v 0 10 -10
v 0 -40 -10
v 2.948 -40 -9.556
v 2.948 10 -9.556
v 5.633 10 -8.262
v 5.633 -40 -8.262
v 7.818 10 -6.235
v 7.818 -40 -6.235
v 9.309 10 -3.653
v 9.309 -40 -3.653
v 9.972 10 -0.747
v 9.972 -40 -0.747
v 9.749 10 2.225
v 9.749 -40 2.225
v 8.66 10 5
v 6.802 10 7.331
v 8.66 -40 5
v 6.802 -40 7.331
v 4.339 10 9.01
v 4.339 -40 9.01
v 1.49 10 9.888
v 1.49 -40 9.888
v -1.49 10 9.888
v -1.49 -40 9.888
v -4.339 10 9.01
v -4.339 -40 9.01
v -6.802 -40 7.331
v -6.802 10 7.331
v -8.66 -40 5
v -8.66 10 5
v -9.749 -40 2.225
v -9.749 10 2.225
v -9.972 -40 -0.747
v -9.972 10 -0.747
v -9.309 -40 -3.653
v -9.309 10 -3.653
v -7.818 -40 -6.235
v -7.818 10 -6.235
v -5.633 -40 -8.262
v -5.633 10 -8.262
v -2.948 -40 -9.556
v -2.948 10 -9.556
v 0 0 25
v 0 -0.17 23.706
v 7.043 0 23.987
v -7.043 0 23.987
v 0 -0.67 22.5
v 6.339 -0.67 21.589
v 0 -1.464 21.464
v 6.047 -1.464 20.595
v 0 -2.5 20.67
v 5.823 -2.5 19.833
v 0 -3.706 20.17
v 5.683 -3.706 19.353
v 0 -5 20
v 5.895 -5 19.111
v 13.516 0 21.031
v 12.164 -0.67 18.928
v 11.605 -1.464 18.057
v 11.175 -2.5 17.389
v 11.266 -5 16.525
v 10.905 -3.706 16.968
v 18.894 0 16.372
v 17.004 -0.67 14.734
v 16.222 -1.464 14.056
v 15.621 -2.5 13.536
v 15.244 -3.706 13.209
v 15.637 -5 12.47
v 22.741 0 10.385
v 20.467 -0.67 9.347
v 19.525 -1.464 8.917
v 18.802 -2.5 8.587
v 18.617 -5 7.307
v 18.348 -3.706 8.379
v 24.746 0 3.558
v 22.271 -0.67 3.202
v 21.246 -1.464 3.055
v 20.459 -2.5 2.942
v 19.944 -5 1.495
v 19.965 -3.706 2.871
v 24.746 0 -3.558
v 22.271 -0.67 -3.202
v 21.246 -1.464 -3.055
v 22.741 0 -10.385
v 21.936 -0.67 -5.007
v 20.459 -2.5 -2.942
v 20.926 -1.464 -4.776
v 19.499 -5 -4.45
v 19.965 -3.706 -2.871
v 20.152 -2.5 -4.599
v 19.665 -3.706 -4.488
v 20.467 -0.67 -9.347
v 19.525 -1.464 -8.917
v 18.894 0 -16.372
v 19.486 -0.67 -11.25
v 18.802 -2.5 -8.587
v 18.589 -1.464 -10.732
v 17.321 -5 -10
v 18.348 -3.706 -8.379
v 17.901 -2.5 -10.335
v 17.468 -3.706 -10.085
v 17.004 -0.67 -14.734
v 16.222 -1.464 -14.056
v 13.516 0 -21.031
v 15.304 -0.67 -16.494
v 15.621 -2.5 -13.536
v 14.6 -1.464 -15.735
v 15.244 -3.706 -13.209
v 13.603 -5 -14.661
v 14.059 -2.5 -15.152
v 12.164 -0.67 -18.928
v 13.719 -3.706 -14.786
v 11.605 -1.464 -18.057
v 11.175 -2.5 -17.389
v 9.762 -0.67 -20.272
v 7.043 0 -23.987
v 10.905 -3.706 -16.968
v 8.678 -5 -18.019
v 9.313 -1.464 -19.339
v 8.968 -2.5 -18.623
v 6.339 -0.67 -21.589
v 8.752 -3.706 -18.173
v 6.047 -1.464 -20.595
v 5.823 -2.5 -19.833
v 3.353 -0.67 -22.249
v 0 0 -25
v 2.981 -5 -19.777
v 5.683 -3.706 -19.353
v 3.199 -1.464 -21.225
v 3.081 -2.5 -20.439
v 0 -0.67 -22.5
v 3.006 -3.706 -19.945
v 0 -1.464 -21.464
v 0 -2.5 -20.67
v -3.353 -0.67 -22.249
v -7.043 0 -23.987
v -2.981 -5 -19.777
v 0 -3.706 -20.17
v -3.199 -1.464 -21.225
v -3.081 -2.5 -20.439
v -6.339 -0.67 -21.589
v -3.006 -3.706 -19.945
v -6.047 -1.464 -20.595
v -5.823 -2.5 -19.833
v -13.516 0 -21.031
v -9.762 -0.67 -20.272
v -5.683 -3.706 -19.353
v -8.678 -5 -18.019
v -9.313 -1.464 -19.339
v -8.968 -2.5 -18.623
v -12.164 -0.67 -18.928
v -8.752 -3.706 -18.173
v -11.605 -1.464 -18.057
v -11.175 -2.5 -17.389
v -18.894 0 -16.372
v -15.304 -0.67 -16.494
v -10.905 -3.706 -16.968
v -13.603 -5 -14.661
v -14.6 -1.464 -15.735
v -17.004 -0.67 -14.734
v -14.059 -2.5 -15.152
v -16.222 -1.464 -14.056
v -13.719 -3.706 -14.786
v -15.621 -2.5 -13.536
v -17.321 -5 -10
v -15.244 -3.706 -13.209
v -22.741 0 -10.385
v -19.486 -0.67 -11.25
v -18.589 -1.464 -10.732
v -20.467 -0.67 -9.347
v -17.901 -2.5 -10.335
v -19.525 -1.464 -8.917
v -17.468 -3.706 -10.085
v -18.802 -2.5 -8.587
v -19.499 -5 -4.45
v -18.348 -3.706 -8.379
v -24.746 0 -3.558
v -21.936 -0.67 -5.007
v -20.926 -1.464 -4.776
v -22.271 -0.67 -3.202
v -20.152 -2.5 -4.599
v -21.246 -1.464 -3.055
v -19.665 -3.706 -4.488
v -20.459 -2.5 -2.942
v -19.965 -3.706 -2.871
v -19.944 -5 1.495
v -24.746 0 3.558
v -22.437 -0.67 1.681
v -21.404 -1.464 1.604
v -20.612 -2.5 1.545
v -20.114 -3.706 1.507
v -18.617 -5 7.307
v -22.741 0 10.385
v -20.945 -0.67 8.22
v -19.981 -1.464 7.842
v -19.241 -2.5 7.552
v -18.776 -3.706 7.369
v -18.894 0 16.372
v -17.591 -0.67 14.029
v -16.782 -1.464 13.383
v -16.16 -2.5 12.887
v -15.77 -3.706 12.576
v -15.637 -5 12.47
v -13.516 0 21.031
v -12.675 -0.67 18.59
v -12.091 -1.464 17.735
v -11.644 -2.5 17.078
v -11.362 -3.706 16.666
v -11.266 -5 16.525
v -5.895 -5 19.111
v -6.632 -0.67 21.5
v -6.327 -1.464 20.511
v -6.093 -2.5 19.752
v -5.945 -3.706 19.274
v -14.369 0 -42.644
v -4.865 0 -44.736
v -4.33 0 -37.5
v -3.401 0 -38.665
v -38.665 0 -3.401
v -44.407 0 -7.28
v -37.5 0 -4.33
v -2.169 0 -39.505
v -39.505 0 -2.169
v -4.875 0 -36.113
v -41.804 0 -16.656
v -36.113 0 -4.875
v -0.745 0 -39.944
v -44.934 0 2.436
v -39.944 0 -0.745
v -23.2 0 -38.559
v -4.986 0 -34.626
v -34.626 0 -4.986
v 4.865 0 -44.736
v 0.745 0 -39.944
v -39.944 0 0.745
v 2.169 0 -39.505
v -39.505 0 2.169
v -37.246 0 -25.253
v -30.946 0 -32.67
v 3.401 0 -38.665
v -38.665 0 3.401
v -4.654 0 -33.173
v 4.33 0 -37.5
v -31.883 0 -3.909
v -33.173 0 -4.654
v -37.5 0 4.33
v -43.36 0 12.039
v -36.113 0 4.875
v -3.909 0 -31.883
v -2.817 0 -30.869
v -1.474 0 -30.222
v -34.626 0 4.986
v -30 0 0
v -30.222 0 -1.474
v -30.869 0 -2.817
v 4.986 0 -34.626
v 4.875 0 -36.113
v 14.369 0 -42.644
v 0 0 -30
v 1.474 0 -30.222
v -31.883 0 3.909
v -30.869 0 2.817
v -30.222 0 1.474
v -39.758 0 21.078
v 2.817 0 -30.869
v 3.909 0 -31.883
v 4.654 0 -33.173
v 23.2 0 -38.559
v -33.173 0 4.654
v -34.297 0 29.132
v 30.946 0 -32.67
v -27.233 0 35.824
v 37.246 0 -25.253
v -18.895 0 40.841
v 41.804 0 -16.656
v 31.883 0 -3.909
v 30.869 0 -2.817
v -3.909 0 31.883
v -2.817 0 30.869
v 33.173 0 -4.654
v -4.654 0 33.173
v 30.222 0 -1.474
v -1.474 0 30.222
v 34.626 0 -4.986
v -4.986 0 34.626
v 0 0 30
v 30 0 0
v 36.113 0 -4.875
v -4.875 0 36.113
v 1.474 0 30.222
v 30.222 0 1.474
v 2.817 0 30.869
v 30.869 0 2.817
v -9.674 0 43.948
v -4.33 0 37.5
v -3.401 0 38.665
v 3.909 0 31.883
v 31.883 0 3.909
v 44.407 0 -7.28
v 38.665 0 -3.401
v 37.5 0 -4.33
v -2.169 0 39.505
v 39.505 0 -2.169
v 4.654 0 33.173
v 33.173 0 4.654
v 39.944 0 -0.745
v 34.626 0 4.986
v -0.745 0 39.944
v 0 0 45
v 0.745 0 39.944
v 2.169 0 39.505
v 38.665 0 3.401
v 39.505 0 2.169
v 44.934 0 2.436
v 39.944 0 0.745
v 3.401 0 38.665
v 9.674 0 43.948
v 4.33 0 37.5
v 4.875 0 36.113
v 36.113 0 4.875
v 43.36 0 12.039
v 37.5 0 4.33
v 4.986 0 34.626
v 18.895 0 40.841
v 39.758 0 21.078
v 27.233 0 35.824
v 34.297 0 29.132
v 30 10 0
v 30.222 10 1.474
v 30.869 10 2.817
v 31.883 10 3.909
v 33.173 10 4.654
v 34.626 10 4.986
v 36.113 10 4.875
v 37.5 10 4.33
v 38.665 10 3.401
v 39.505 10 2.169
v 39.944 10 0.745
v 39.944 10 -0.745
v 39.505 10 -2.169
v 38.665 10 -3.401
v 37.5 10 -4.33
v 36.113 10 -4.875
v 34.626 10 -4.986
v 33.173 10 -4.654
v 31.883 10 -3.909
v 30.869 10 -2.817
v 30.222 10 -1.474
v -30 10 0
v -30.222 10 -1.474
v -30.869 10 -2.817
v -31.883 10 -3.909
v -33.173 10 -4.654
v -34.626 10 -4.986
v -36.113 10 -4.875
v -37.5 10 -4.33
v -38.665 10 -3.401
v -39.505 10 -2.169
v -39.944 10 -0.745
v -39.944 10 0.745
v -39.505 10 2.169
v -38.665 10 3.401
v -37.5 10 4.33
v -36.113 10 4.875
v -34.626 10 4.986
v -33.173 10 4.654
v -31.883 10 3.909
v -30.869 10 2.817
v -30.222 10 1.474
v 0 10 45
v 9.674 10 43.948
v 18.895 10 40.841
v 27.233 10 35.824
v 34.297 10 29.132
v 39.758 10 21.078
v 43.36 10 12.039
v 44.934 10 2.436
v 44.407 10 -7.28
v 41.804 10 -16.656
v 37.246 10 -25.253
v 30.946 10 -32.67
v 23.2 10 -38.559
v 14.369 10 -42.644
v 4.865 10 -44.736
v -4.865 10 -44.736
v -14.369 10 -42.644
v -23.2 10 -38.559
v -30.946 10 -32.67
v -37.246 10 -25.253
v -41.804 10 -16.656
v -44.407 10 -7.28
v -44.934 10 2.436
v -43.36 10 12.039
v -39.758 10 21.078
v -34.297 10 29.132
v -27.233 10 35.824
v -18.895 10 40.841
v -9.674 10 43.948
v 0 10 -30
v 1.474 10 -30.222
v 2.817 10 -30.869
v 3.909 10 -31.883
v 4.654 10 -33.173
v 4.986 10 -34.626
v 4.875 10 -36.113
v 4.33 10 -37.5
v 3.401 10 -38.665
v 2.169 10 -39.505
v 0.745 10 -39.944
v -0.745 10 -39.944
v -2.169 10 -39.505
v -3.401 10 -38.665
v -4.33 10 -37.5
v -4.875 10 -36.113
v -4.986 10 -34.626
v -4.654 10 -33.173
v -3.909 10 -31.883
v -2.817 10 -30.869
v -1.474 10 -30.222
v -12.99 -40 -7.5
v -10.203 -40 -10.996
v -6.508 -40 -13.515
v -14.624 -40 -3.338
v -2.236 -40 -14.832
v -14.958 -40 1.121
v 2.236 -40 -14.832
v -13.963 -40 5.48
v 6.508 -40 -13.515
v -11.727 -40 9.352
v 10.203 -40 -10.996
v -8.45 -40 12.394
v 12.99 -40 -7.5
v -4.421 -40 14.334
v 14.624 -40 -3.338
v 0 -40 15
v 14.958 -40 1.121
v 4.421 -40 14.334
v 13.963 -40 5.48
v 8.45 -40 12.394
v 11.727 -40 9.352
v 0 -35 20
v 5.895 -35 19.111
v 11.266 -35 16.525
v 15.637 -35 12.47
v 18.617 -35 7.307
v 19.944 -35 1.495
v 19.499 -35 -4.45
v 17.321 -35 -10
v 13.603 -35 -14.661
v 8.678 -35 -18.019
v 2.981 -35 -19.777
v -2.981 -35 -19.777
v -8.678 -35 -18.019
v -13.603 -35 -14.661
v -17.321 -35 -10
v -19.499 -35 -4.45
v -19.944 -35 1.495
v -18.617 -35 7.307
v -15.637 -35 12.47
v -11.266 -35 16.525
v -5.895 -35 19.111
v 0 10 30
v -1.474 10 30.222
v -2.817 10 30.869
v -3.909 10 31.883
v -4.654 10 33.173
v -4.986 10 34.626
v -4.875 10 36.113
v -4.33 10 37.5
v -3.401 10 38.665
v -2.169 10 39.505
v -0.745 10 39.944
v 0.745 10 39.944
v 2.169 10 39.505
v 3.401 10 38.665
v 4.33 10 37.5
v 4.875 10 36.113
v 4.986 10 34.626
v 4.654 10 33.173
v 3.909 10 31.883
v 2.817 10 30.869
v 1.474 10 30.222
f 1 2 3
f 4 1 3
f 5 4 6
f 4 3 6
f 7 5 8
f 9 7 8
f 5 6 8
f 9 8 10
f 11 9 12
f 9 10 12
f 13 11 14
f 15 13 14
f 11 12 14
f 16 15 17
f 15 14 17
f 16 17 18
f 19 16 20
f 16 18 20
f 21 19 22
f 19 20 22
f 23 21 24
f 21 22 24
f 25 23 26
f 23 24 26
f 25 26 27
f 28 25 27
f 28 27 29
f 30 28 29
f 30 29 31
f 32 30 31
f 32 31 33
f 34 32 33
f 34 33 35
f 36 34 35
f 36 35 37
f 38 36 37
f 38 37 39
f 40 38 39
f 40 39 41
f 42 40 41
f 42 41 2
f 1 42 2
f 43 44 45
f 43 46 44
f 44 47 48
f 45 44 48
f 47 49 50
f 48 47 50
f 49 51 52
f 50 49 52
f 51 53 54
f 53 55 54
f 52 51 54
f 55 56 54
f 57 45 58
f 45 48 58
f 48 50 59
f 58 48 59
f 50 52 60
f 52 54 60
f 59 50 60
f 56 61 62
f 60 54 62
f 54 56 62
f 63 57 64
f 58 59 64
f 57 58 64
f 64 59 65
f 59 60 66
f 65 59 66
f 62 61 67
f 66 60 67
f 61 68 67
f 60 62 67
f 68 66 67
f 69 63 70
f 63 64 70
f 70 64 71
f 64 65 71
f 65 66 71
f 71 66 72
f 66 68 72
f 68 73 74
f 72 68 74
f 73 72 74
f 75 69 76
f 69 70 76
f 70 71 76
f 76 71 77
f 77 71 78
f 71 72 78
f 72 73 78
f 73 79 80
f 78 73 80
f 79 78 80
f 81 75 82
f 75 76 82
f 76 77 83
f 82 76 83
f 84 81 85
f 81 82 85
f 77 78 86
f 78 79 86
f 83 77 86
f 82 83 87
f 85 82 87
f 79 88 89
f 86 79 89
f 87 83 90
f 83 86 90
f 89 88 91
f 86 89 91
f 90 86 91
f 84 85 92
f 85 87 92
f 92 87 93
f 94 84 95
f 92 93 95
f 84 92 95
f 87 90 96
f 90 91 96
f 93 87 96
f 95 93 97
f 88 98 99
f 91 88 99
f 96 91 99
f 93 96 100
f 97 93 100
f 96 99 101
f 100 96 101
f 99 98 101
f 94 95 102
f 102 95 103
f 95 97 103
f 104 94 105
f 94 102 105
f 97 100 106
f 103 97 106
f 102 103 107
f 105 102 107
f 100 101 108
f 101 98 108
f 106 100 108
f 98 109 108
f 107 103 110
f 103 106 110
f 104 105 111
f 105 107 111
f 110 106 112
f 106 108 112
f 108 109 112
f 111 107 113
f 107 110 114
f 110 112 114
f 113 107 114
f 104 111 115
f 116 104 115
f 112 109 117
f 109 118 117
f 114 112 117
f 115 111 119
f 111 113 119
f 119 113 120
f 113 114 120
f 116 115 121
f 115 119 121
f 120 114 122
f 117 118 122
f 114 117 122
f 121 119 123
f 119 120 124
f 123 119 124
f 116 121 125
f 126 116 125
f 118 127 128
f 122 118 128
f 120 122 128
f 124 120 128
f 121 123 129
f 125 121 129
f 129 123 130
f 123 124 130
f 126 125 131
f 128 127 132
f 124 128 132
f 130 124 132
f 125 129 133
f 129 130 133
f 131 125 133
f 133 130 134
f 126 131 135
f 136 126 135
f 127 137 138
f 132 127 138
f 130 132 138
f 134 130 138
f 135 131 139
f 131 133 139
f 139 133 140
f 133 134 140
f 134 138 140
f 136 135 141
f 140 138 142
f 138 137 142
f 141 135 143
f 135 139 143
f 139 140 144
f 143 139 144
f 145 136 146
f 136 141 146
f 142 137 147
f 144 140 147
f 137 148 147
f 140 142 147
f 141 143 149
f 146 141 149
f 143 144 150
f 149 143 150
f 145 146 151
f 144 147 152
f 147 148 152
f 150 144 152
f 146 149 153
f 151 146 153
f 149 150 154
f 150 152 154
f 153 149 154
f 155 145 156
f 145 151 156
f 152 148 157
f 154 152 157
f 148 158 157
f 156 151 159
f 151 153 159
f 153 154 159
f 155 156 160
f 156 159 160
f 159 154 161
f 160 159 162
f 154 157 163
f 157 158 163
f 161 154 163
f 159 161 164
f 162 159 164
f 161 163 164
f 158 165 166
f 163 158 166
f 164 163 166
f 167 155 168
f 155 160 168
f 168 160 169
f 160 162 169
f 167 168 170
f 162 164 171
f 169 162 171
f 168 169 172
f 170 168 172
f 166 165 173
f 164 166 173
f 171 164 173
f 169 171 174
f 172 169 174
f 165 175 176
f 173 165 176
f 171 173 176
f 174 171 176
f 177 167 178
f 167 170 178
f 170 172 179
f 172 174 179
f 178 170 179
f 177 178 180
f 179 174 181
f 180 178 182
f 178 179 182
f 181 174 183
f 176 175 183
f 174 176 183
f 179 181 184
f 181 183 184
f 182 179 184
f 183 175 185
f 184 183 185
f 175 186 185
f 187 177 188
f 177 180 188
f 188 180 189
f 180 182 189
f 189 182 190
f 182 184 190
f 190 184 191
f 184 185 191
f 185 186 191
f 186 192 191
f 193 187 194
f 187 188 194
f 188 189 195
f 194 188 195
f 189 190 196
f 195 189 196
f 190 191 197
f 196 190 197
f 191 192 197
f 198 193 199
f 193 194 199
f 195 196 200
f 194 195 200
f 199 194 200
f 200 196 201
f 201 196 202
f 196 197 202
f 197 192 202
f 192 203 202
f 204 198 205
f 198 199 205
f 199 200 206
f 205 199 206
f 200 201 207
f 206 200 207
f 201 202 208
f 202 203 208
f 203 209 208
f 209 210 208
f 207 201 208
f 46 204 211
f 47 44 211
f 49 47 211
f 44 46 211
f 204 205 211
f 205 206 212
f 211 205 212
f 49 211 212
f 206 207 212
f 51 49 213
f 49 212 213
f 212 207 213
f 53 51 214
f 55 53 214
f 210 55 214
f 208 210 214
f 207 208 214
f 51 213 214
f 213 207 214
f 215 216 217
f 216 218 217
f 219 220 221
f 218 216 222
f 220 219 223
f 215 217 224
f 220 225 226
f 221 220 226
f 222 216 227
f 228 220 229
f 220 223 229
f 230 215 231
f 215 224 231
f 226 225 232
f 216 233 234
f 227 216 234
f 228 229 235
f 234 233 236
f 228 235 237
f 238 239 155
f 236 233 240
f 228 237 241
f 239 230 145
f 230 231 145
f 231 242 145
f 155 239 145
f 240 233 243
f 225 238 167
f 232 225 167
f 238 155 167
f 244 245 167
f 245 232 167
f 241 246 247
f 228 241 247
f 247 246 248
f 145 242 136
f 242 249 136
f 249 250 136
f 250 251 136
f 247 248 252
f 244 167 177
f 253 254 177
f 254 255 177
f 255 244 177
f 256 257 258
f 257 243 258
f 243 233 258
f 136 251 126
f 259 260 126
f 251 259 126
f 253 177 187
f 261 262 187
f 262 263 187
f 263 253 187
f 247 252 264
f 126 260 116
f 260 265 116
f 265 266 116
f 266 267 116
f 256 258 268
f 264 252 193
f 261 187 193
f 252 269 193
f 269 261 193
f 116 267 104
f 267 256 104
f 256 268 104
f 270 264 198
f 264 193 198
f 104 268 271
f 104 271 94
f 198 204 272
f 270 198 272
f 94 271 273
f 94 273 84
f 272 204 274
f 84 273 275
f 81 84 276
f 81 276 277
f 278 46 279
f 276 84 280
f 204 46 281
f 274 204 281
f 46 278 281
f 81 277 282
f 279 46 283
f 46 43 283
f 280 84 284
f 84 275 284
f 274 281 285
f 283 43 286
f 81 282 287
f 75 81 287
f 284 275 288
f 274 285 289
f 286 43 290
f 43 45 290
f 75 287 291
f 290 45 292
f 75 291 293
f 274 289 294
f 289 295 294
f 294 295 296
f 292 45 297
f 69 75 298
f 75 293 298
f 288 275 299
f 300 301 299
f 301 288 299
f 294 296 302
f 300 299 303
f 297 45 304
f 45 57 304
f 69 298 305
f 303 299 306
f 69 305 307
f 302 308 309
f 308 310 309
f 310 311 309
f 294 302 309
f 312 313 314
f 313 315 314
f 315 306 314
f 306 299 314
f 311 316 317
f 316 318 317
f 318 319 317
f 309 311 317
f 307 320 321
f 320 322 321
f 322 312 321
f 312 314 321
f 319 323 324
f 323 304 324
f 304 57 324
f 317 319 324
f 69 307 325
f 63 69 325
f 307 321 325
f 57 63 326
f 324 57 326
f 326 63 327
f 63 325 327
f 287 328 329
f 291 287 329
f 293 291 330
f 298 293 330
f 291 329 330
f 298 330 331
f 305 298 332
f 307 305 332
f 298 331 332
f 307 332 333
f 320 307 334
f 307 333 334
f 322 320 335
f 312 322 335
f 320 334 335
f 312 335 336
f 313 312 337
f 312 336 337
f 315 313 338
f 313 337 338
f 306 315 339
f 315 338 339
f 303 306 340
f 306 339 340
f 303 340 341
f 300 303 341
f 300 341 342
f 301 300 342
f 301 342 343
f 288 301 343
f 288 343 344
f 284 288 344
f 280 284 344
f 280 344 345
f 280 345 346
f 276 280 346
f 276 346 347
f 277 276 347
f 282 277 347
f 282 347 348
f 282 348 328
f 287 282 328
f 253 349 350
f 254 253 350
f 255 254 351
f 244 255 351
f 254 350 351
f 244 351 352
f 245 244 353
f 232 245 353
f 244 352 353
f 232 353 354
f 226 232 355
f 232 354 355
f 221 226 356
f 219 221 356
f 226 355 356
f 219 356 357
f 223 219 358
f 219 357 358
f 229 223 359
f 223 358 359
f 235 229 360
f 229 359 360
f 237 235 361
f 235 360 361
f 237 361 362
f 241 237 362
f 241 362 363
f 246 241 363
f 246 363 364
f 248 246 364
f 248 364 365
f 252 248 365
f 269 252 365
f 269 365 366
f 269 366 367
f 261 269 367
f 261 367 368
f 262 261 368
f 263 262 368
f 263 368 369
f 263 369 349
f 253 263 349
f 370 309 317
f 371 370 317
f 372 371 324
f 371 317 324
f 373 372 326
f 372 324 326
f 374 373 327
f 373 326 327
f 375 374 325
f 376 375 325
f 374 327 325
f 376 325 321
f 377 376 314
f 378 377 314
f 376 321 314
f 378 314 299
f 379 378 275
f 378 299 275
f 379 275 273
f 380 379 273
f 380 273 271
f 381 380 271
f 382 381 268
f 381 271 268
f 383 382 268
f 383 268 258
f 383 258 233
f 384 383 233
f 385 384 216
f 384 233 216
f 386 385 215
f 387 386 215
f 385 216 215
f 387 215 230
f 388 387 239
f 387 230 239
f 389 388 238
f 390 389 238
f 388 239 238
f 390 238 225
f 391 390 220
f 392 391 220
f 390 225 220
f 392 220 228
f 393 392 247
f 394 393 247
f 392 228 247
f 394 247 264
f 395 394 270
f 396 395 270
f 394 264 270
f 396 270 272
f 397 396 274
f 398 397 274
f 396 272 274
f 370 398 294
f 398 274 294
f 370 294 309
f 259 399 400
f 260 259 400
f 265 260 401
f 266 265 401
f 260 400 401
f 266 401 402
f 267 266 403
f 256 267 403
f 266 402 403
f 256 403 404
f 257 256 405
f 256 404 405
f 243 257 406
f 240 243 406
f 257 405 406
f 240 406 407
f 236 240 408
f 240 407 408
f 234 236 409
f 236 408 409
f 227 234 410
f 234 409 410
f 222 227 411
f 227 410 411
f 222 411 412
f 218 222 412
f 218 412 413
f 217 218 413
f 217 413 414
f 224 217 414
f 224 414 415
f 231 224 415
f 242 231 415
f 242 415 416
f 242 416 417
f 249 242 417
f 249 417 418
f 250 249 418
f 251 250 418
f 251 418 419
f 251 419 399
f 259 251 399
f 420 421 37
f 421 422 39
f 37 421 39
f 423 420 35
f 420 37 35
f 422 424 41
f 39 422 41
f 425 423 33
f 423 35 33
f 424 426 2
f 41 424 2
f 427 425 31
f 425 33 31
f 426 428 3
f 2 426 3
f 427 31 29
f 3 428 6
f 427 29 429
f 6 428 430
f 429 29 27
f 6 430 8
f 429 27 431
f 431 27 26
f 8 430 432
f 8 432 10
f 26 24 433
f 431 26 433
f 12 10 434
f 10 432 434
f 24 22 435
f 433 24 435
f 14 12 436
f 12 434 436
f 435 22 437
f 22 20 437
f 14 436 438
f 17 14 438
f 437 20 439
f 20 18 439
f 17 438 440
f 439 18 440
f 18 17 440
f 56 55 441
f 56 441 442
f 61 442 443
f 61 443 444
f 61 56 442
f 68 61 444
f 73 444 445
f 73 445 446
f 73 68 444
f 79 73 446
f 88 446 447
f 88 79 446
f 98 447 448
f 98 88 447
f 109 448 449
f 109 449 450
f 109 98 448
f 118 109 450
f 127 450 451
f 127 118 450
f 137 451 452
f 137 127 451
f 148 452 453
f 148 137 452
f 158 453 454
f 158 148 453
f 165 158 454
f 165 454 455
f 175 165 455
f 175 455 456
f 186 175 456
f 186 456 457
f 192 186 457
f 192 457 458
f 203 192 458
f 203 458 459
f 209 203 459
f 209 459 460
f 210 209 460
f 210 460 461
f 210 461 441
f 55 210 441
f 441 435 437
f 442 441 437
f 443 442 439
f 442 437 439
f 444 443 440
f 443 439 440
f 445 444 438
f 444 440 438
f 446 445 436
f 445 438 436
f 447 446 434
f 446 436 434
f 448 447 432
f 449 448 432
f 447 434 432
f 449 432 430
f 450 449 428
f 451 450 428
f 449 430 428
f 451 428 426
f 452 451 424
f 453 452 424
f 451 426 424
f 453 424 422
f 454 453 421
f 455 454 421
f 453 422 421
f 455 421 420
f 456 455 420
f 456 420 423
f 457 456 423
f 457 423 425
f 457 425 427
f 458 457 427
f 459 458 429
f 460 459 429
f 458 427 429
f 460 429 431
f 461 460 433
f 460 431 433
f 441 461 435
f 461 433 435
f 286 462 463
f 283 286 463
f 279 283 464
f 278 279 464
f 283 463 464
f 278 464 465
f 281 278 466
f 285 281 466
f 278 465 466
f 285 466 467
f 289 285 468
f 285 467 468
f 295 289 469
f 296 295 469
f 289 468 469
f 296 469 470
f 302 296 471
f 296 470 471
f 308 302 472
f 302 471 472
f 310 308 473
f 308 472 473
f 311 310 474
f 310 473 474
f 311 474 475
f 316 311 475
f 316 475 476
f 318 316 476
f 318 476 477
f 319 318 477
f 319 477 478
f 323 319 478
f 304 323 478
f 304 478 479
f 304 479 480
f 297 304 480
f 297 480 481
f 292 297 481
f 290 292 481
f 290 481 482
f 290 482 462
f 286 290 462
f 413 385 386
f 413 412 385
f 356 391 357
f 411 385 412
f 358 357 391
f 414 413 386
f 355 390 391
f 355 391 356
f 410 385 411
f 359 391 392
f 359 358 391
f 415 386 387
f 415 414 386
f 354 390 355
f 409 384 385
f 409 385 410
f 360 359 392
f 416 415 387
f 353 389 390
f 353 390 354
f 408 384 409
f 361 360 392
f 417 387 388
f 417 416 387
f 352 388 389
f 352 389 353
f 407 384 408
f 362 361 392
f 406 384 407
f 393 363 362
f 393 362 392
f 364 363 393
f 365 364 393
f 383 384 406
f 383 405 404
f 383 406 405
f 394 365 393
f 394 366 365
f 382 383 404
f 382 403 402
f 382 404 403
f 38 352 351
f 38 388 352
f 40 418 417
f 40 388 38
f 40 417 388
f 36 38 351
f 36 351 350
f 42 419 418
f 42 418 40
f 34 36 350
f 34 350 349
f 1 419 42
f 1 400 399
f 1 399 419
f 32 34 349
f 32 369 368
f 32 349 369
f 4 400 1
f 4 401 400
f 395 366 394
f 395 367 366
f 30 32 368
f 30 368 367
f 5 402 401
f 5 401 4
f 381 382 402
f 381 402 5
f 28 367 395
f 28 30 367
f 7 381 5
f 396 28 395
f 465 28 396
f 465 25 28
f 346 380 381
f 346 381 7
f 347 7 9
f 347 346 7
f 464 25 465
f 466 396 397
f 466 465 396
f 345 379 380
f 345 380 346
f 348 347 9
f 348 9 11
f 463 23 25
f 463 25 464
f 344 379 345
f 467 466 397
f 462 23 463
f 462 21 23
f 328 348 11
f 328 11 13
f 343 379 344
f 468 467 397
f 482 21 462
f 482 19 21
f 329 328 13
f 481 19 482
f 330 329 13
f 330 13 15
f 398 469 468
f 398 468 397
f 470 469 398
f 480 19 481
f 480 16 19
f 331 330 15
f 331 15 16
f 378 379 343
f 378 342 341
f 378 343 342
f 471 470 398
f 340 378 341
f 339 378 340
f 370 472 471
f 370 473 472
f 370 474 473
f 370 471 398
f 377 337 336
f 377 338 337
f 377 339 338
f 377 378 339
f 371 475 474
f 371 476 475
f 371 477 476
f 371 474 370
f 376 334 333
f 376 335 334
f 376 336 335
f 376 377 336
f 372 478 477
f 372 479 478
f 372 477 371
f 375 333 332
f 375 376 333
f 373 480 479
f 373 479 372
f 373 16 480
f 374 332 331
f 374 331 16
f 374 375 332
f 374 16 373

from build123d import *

# Parameters (mm, degrees)
SKICA1_R                 = 45
P_IDAT_VYSUNUT_M1_DEPTH  = 10
SKICA3_R                 = 5
ODEBRAT_VYSUNUT_M1_DEPTH = 65.420493634
KRUHOV_POLE1_COUNT       = 4
SKICA4_R                 = 20
P_IDAT_VYSUNUT_M2_DEPTH  = 50
SKICA5_R                 = 10
ODEBRAT_VYSUNUT_M2_DEPTH = 81.932070281
ZAOBLIT1_R               = 5
ZKOSEN_1_SIZE            = 5


with BuildPart() as part:
    # Skica1 → Přidat vysunutím1 (new body)
    with BuildSketch(Plane(origin=(0, 0, 0), x_dir=(1, 0, 0), z_dir=(0, 1, 0))):
        with Locations(Location((0, 0, 0), (0, 0, 270))):
            Circle(SKICA1_R)
    extrude(amount=P_IDAT_VYSUNUT_M1_DEPTH)

    # Skica3 → Odebrat vysunutím1 (cut, through all)
    with BuildSketch(Plane(origin=(0, 10, 0), x_dir=(1, 0, 0), z_dir=(0, 1, 0))):
        with Locations(Location((0, 35, 0), (0, 0, 270))):
            Circle(SKICA3_R)
    odebrat_vysunut_m1 = extrude(amount=-ODEBRAT_VYSUNUT_M1_DEPTH, mode=Mode.SUBTRACT)

    # Kruhové pole1: Odebrat vysunutím1 ×4 about axis
    kruhov_pole1_axis = Axis((0, 0, 0), (0, 1, 0))
    for i in range(1, KRUHOV_POLE1_COUNT):
        add(odebrat_vysunut_m1.rotate(kruhov_pole1_axis, i * 360 / KRUHOV_POLE1_COUNT), mode=Mode.SUBTRACT)

    # Skica4 → Přidat vysunutím2 (add)
    with BuildSketch(Plane(origin=(0, 10, 0), x_dir=(1, 0, 0), z_dir=(0, 1, 0))):
        with Locations(Location((0, 0, 0), (0, 0, 270))):
            Circle(SKICA4_R)
    extrude(amount=-P_IDAT_VYSUNUT_M2_DEPTH)

    # Skica5 → Odebrat vysunutím2 (cut, through all)
    with BuildSketch(Plane.XZ.offset(40)):
        with Locations(Location((0, 0, 0), (0, 0, 270))):
            Circle(SKICA5_R)
    extrude(amount=-ODEBRAT_VYSUNUT_M2_DEPTH, mode=Mode.SUBTRACT)

    # Zaoblit1
    zaoblit1_edges = [part.edges().sort_by_distance(p)[0] for p in [
        (0, 0, -20),
    ]]
    fillet(zaoblit1_edges, radius=ZAOBLIT1_R)

    # Zkosení1
    zkosen_1_edges = [part.edges().sort_by_distance(p)[0] for p in [
        (0, -40, -20),
    ]]
    chamfer(zkosen_1_edges, length=ZKOSEN_1_SIZE)


solid = part.part
